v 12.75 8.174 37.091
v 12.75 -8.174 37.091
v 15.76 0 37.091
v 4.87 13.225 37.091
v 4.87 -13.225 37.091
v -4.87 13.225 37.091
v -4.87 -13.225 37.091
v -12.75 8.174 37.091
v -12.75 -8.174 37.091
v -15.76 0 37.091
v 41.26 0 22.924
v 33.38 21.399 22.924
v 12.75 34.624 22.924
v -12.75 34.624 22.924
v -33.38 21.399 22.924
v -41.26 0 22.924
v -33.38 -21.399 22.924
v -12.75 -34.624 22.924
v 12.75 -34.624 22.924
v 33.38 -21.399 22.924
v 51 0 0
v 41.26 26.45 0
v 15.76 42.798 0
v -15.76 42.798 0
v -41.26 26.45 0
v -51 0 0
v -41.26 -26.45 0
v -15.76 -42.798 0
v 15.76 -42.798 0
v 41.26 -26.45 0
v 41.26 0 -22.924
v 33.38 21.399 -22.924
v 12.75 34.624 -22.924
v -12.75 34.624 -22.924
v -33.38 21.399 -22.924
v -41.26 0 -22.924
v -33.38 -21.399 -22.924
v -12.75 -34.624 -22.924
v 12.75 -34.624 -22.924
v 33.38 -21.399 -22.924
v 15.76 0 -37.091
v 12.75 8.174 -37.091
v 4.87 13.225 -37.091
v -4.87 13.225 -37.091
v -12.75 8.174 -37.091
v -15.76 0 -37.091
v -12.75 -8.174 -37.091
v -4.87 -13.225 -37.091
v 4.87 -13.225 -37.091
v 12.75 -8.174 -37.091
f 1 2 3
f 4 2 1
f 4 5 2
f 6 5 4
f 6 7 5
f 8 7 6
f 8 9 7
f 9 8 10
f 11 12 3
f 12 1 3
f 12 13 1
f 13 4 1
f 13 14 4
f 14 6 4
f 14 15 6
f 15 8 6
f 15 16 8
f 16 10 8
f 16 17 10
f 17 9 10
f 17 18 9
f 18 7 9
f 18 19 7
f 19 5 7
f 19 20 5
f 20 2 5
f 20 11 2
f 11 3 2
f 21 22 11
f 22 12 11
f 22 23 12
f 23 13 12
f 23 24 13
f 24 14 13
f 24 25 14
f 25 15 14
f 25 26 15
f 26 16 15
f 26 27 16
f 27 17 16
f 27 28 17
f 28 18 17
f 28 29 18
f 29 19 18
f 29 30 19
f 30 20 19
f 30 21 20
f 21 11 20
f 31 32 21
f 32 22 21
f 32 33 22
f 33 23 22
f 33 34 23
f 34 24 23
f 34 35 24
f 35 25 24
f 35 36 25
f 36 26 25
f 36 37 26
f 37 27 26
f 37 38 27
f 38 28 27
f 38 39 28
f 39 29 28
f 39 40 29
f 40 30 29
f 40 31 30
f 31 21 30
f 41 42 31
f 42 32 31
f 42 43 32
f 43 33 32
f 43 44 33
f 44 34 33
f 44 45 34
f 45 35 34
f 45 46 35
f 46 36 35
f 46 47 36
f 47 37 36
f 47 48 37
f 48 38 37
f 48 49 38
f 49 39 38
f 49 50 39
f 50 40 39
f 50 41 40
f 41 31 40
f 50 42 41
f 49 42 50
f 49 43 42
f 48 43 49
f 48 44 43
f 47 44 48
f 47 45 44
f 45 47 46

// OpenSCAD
// Generated by SolidPython 1.0.1 on 2020-07-29 00:46:53


scale(v = [17, 15, 13]) {
	sphere(r = 3);
}
/***********************************************
*********      SolidPython code:      **********
************************************************
 
# import packages: SolidPython
from solid import *
from solid.utils import *
from itertools import chain, combinations, permutations


class Resize:

    def __init__(self, scad_file):
        self.scad_file = scad_file
        #self.scad_file = import_scad(scad_file)
        # cone/cylinder param:
        self.r1 = 0
        self.r2 = 0
        self.h = 0
        # rectangular prism param:
        self.w = 0
        self.l = 0
        # ellipse param:
        self.r = 0

    # import OpenScad code (file name corresponds to shape)


    # classify shape + parameters
    def assign(self, param1, param2, param3):
        if self.scad_file == 'cone.scad':
            self.r1 = param1
            self.r2 = param2
            self.h = param3
        elif self.scad_file == 'cylinder.scad':
            self.r1 = param1
            self.r2 = param2
            self.h = param3
        elif self.scad_file == 'rectangularPrism.scad':
            self.h = param1
            self.l = param2
            self.w = param3
        else:
            self.r = param1
            self.h = param2

    # resize parameters
    def iterate(self):
        x = range(3, 20, 2)
        i = 1
        if self.scad_file == 'cone.scad':
            tempList = list(permutations(x, 2))
            for temp in tempList:
                param1 = temp[0]
                param2 = temp[1]
                filepath = 'produced_scad_files/' + 'cone' + str(param1) + '_' + str(param2) + '_' + '.scad'
                scad_render_to_file(cylinder(h=param1, r1=param2, r2=0), filepath)

        elif self.scad_file == 'cylinder.scad':
            tempList = list(permutations(x, 3))
            for temp in tempList:
                param1 = temp[0]
                param2 = temp[1]
                filepath = 'produced_scad_files/' + 'cylinder' + str(param1) + '_' + str(param2) + '_' + '.scad'
                scad_render_to_file(cylinder(h=param1, r1=param2, r2=param2), filepath)

        elif self.scad_file == 'rectangularPrism.scad':
            tempList = list(permutations(x, 3))
            for temp in tempList:
                param1 = temp[0]
                param2 = temp[1]
                param3 = temp[2]
                filepath = 'produced_scad_files/' + 'rectangularPrism' + str(param1) + '_' + str(param2) + '_' + str(
                    param3) + '.scad'
                scad_render_to_file(cube(size=(param1, param2, param3)), filepath)

        elif self.scad_file == 'ellipse.scad':
            tempList = list(permutations(x, 4))
            for temp in tempList:
                param1 = temp[0]
                param2 = temp[1]
                param3 = temp[2]
                param4 = temp[3]
                filepath = 'produced_scad_files/' + 'ellipse' + str(param1) + '_' + str(param2) + '_' + str(param3) + '_' + str(param4) + '.scad'
                scad_render_to_file(scale([param1, param2, param3])(sphere(r=param4)), filepath)

    def render_to_scadfile(self):
        scad_render_to_file(scad, 'example.scad') 
 
************************************************/
